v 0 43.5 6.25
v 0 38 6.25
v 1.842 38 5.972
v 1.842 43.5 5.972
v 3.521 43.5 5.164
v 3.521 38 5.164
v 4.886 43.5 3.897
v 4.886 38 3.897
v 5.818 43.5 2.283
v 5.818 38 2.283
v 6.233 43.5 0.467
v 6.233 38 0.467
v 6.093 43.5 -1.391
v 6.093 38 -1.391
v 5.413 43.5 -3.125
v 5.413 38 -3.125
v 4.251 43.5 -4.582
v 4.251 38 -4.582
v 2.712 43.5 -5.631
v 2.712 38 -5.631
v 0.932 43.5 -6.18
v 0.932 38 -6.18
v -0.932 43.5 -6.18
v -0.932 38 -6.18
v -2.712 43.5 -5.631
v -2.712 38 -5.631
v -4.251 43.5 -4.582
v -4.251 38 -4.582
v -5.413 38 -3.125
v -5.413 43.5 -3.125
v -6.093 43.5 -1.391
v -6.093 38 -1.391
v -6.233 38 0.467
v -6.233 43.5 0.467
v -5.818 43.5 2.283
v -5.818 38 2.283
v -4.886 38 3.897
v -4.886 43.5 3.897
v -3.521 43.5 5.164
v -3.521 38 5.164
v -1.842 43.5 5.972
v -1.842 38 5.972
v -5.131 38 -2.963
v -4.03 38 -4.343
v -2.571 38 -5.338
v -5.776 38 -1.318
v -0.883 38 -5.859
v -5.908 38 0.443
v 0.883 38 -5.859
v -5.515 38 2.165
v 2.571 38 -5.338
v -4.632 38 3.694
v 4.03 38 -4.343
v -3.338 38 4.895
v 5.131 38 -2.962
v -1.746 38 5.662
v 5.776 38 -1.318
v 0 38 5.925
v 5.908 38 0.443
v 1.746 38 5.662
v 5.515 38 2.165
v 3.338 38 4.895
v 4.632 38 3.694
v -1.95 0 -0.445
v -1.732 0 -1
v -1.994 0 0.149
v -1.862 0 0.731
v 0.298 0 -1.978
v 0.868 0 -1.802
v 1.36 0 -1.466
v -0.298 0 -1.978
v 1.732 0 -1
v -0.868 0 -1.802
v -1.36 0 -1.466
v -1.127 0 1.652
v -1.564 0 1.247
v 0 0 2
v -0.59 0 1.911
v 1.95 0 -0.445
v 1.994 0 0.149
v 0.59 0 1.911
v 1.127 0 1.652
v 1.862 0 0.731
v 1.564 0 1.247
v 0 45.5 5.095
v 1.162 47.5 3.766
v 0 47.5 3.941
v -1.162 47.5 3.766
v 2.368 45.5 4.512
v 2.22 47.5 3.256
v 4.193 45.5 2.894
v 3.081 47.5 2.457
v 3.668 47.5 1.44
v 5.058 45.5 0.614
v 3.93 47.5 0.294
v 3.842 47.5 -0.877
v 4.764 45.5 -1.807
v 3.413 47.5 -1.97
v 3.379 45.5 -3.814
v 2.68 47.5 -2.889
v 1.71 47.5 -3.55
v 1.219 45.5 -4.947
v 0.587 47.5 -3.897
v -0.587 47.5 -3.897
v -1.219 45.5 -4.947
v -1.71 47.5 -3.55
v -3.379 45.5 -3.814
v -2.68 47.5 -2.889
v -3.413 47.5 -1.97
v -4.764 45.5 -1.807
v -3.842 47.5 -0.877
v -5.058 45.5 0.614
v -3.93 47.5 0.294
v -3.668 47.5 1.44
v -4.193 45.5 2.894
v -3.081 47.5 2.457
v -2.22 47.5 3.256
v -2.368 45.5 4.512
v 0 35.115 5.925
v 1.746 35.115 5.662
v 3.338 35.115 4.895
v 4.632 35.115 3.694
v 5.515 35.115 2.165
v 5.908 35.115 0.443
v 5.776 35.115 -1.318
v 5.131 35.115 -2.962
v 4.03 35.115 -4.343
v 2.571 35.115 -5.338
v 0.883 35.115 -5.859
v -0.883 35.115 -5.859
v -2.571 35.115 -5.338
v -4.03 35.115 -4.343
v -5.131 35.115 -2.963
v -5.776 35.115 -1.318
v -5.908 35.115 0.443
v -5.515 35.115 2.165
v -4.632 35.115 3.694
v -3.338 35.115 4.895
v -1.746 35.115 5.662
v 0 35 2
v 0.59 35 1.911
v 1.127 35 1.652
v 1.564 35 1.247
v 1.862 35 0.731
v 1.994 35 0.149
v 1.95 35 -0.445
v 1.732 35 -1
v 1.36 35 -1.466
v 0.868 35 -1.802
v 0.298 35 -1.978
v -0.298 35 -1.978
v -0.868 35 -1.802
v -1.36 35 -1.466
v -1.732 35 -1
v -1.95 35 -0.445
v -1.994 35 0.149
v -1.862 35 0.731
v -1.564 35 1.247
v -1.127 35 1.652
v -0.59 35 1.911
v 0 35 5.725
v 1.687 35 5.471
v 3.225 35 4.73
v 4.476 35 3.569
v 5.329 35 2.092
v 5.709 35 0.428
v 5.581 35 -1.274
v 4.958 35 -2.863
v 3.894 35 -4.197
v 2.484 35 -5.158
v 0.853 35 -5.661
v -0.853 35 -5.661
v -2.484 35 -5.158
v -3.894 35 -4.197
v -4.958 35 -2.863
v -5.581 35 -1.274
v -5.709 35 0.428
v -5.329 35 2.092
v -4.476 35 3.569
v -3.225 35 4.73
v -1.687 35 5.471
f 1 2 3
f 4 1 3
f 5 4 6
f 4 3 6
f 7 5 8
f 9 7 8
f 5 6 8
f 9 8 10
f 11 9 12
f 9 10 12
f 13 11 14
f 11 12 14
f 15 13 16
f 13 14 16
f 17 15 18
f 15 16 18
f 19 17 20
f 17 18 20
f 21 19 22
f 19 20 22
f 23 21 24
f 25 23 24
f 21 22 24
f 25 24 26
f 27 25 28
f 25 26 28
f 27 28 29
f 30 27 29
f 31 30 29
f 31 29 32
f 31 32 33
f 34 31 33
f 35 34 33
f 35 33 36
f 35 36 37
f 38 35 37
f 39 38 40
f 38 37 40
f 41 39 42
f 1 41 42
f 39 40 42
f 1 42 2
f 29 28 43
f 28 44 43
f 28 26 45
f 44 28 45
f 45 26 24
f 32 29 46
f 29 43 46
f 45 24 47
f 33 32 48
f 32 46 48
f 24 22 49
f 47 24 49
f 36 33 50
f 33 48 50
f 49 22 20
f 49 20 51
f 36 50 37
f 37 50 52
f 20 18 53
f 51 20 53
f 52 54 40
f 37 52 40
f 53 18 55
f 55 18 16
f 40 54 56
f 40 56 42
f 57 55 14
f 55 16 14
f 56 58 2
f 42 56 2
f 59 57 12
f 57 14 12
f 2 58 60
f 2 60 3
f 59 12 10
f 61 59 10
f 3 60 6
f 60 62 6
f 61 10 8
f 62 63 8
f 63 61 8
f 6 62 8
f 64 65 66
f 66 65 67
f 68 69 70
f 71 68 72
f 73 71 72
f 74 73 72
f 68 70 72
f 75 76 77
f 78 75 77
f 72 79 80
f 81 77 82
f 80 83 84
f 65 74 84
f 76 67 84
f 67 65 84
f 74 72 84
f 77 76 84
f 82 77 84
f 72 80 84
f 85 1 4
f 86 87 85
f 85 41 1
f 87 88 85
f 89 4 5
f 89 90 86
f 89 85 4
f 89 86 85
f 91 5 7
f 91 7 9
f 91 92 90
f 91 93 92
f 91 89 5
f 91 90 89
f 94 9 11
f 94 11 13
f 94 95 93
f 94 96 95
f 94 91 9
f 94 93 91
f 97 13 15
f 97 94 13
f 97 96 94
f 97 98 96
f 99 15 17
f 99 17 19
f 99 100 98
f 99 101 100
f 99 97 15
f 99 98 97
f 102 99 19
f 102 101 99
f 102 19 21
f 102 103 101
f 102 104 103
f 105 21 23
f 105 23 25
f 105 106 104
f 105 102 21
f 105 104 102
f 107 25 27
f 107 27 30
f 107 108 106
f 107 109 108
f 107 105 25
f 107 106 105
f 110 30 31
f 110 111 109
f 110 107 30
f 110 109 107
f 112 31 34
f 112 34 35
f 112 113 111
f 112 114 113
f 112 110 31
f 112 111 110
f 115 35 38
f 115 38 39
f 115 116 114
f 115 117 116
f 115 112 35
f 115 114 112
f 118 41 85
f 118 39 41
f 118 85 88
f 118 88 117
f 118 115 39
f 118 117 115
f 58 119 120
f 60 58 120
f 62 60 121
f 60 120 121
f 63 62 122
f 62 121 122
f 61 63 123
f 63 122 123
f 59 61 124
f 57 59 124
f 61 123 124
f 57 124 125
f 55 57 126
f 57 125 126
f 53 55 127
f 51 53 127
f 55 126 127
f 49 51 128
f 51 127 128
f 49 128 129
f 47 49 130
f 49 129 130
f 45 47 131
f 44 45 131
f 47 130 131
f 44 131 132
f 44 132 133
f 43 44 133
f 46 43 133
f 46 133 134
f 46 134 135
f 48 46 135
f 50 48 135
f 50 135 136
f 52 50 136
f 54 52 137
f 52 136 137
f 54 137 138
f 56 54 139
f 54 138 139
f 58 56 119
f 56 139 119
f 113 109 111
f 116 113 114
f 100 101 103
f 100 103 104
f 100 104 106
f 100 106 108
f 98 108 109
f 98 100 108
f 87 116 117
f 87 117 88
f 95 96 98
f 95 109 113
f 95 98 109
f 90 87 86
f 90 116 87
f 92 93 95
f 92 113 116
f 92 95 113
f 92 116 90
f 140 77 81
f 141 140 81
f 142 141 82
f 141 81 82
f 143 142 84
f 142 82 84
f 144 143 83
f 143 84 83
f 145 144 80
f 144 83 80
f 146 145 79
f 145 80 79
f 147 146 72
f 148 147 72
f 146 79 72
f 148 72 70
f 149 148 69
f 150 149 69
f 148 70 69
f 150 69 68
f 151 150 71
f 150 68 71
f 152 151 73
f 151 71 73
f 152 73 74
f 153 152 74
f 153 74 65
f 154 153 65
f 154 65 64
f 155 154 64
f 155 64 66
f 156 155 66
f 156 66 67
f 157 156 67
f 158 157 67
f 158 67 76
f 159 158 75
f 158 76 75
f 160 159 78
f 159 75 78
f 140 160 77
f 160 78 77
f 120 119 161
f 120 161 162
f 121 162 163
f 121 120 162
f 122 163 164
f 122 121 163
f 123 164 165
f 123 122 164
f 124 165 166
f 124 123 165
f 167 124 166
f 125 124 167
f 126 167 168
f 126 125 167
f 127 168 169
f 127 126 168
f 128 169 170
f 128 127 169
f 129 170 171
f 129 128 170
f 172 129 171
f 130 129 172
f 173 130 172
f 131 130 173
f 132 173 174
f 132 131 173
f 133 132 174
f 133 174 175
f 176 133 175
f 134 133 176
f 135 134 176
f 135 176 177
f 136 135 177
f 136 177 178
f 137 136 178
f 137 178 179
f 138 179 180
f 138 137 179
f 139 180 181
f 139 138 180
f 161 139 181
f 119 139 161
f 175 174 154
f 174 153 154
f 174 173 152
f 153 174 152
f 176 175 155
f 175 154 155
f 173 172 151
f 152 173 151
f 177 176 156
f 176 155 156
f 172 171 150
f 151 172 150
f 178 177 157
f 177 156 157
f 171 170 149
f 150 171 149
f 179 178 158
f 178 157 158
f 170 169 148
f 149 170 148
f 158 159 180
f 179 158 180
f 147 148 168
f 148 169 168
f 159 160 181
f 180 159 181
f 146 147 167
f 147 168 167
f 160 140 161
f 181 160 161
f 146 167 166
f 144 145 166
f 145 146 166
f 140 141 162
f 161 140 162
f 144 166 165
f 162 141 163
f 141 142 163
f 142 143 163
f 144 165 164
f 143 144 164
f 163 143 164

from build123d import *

# Parameters (mm, degrees)
SKETCH_1_R      = 2
EXTRUDE_1_DEPTH = 35
SKETCH_2_R      = 5.925
EXTRUDE_2_DEPTH = 3
SKETCH_3_R      = 6.25
EXTRUDE_3_DEPTH = 9.5
CHAMFER_1_SIZE  = 4
CHAMFER_1_SIZE2 = 2.309401077
CHAMFER_2_SIZE  = 0.2
CHAMFER_2_SIZE2 = 0.115470054


with BuildPart() as part:
    # 草图1 → 凸台-拉伸1 (new body)
    with BuildSketch(Plane(origin=(0, 0, 0), x_dir=(1, 0, 0), z_dir=(0, 1, 0))):
        with Locations(Location((0, 0, 0), (0, 0, 270))):
            Circle(SKETCH_1_R)
    extrude(amount=EXTRUDE_1_DEPTH)

    # 草图2 → 凸台-拉伸2 (add)
    with BuildSketch(Plane(origin=(0, 35, 0), x_dir=(1, 0, 0), z_dir=(0, 1, 0))):
        with Locations(Location((0, 0, 0), (0, 0, 270))):
            Circle(SKETCH_2_R)
    extrude(amount=EXTRUDE_2_DEPTH)

    # 草图3 → 凸台-拉伸3 (add)
    with BuildSketch(Plane(origin=(0, 38, 0), x_dir=(1, 0, 0), z_dir=(0, 1, 0))):
        with Locations(Location((0, 0, 0), (0, 0, 270))):
            Circle(SKETCH_3_R)
    extrude(amount=EXTRUDE_3_DEPTH)

    # 倒角1
    chamfer_1_edges = [part.edges().sort_by_distance(p)[0] for p in [
        (0, 47.5, -6.25),
    ]]
    chamfer_1_side = [part.faces().sort_by_distance(p)[0] for p in [
        (0, 42.75, -6.25),
    ]]
    chamfer(chamfer_1_edges, length=CHAMFER_1_SIZE, length2=CHAMFER_1_SIZE2, reference=chamfer_1_side[0])

    # 倒角2
    chamfer_2_edges = [part.edges().sort_by_distance(p)[0] for p in [
        (0, 35, -5.925),
    ]]
    chamfer_2_side = [part.faces().sort_by_distance(p)[0] for p in [
        (0, 35, -5.757415693),
    ]]
    chamfer(chamfer_2_edges, length=CHAMFER_2_SIZE, length2=CHAMFER_2_SIZE2, reference=chamfer_2_side[0])


solid = part.part
